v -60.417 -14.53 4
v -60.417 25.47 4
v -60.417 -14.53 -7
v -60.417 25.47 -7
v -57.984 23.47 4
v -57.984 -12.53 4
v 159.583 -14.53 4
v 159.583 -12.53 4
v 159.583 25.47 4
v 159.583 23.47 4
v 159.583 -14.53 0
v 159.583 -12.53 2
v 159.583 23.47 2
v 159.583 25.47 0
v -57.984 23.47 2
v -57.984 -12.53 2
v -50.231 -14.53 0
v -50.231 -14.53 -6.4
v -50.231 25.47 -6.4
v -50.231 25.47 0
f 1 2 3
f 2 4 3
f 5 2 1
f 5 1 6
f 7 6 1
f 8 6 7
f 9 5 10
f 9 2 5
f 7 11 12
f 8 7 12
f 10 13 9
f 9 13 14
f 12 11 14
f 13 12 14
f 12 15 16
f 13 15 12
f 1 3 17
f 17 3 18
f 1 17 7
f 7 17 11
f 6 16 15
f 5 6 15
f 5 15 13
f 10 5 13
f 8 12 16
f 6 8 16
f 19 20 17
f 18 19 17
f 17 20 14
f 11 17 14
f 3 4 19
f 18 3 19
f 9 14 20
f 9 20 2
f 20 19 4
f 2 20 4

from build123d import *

# Parameters (mm, degrees)
F0_W     = 220
F0_H     = 40
F1_DEPTH = 2
F2_W     = 10.18609
F2_H     = 40
F3_DEPTH = 7
F5_DEPTH = 2
F7_DEPTH = 40.001


with BuildPart() as f1:
    # F0 (on Top) → F1 (new body)
    with BuildSketch(Plane.XY):
        with Locations((49.58334, 5.469682)):
            Rectangle(F0_W, F0_H)
    extrude(amount=F1_DEPTH)

    # F2 (on face) → F3 (join)
    with BuildSketch(Plane(origin=(0, 0, 0), x_dir=(1, 0, 0), z_dir=(0, 0, -1))):
        with Locations((-55.323615, -5.469682)):
            Rectangle(F2_W, F2_H)
    extrude(amount=F3_DEPTH)

    # F4 (on face) → F5 (join)
    with BuildSketch(Plane.XY.offset(2)):
        Polygon((159.58334, 25.469682), (-60.41666, 25.469682), (-60.41666, -14.530318), (159.58334, -14.530318), (159.58334, -12.530318), (-57.984237, -12.530318), (-57.984237, 23.469682), (159.58334, 23.469682), align=None)
    extrude(amount=F5_DEPTH)

    # F6 (on face) → F7 (cut, through all)
    with BuildSketch(Plane(origin=(0, 25.469682, 0), x_dir=(-1, 0, 0), z_dir=(0, 1, 0))):
        Polygon((50.23057, -6.4), (50.23057, -7), (60.41666, -7), align=None)
    extrude(amount=-F7_DEPTH, mode=Mode.SUBTRACT)


solid = f1.part
